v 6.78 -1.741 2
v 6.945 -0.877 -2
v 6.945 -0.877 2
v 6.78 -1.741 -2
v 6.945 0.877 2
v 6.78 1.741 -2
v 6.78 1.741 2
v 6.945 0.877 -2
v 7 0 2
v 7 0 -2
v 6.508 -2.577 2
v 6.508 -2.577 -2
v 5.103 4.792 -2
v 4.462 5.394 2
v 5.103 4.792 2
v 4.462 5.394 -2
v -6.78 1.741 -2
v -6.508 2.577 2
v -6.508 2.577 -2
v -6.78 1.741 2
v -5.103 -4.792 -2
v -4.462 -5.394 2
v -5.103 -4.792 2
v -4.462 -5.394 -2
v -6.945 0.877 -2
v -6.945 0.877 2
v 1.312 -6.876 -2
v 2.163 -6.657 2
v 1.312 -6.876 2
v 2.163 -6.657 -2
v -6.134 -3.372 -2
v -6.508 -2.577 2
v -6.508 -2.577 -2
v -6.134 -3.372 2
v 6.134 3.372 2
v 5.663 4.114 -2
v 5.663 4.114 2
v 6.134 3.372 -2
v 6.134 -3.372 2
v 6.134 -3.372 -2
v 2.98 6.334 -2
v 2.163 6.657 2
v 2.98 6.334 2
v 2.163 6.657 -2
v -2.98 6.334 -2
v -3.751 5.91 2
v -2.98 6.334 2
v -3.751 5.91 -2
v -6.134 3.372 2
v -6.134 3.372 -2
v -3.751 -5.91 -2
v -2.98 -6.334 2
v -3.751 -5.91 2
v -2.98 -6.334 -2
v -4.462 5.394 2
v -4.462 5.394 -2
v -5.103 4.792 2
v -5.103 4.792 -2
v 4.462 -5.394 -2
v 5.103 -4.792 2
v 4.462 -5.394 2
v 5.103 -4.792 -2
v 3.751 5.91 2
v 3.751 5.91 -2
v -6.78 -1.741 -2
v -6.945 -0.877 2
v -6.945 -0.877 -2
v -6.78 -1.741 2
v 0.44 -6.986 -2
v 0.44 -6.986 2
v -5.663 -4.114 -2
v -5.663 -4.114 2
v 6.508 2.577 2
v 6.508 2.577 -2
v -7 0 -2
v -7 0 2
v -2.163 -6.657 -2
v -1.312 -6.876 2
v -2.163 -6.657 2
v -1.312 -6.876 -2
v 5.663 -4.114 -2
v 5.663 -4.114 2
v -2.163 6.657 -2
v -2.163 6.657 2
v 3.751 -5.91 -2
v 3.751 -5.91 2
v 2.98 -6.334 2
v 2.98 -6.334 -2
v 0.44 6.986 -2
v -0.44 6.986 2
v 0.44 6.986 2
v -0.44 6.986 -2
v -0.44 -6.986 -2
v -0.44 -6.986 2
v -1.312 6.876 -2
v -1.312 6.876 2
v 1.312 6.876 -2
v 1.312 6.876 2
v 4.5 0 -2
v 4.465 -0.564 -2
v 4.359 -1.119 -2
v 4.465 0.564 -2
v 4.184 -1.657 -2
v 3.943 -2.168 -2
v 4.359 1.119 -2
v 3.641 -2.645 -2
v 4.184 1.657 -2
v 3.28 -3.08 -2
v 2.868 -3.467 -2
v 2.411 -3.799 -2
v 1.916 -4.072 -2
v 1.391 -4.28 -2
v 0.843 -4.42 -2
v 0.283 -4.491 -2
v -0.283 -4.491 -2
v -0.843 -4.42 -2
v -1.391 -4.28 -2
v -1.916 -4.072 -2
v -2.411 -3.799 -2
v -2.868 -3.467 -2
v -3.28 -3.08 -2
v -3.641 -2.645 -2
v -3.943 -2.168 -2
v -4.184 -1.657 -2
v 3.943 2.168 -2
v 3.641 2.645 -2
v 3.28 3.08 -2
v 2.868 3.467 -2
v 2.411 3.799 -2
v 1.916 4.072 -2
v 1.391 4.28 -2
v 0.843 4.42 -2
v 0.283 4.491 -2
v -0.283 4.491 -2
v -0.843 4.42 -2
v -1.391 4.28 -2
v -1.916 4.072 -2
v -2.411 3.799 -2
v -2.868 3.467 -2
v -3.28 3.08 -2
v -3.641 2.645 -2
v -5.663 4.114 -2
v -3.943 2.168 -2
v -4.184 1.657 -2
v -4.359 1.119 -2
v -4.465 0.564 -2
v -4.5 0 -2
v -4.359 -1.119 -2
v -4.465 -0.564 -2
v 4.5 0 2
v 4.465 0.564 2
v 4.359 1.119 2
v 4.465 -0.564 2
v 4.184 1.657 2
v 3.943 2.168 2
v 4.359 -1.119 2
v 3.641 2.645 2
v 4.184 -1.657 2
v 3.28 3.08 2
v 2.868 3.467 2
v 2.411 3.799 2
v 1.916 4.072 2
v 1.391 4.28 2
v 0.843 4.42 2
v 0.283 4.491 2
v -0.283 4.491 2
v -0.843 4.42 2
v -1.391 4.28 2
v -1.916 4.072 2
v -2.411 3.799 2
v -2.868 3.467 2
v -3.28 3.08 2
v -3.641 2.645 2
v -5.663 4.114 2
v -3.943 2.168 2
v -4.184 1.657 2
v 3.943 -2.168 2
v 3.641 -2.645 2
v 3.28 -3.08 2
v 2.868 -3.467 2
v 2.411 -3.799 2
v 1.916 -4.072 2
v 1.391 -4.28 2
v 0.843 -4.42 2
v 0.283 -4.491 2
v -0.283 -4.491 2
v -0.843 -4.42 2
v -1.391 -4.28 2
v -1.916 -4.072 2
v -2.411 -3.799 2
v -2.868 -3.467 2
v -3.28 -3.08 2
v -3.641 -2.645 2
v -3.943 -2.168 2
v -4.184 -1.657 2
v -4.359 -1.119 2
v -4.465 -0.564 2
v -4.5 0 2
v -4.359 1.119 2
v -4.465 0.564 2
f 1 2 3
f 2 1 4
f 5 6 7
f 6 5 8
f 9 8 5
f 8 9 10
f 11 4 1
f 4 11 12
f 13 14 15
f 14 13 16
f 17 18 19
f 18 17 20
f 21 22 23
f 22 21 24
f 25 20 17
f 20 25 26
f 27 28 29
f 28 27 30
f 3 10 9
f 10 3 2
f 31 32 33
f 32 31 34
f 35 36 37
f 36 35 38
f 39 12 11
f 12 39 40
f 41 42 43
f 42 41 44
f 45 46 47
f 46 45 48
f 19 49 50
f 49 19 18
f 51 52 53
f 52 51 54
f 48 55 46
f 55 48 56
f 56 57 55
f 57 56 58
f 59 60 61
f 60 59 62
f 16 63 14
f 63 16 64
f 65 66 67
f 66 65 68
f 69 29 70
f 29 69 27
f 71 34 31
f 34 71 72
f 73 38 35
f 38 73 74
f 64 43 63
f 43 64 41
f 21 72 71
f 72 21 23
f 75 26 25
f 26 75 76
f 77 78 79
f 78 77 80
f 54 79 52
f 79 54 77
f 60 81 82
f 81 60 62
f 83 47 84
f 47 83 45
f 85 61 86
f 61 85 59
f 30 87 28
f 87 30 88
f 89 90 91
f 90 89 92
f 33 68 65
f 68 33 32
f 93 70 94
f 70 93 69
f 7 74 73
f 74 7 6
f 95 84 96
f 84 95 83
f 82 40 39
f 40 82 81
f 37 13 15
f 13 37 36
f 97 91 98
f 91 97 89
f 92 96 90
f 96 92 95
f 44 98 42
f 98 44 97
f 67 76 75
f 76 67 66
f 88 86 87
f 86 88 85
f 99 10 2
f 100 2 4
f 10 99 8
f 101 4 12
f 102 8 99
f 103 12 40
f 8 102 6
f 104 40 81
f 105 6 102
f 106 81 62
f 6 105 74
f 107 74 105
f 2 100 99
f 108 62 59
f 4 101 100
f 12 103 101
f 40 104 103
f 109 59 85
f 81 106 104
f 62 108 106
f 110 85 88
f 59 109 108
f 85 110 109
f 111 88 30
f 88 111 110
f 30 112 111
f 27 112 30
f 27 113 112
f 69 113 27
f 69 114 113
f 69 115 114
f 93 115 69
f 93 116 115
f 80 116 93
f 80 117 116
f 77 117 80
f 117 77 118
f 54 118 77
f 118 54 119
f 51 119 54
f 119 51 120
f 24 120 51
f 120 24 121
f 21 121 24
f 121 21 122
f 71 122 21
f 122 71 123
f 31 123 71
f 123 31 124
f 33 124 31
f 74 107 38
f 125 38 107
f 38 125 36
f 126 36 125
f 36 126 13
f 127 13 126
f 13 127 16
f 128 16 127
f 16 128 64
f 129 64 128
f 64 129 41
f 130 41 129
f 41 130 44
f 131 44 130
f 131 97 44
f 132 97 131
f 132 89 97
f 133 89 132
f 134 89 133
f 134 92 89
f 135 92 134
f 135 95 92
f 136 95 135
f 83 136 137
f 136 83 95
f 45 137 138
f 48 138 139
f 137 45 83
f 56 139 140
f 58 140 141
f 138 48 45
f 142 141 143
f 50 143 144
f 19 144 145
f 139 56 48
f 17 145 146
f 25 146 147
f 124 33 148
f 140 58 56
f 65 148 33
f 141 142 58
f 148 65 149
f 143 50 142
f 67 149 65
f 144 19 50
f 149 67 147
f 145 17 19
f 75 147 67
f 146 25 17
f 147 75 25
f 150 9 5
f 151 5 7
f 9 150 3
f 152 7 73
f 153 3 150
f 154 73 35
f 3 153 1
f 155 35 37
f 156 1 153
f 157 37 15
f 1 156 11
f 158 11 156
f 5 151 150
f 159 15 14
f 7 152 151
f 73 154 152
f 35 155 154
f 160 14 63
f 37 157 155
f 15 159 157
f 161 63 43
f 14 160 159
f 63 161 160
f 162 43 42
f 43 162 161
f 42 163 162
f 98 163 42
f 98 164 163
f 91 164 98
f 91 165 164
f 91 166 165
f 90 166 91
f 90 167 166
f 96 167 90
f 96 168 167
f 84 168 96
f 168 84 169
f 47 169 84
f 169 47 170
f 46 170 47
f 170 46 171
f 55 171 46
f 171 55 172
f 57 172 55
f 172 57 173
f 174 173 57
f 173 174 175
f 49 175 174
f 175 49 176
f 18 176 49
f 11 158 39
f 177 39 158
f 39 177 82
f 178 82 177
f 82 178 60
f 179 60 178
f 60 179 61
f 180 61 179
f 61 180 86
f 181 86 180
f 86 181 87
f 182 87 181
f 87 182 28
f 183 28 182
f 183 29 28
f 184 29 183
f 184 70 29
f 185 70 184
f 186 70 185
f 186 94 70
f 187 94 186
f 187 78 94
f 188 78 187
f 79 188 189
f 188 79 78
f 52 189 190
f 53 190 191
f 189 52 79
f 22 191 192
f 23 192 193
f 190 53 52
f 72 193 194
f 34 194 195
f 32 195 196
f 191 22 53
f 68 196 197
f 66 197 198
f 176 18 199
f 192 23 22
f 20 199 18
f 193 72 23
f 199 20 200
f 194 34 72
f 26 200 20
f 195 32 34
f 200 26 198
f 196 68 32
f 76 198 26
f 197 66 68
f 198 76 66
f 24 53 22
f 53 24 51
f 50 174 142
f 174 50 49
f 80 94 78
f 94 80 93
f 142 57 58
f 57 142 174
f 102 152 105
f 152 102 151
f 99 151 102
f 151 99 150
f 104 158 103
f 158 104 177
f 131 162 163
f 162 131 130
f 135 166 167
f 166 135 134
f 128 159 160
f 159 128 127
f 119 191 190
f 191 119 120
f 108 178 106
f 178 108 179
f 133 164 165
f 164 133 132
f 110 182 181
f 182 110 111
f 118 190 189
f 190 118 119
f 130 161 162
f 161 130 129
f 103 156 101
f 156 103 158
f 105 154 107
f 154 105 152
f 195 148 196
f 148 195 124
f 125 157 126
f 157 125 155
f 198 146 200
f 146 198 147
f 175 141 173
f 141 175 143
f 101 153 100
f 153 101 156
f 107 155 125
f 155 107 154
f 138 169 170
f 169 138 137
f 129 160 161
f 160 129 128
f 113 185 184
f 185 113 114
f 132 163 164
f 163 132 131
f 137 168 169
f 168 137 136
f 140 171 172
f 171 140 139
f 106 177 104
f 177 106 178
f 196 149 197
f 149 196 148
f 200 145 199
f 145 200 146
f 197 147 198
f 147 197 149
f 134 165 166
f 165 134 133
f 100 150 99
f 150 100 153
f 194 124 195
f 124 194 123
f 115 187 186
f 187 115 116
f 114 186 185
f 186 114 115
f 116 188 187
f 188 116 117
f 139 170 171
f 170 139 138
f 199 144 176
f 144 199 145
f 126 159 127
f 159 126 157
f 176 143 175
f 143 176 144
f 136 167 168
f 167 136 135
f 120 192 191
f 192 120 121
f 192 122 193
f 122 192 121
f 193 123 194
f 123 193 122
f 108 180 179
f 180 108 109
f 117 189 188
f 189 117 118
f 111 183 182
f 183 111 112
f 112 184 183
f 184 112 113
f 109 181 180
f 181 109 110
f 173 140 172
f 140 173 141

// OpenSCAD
$fn = 50;


difference() {
	union() {
		translate(v = [0, 0, -2.0000000000]) {
			cylinder(h = 4, r = 7.0000000000);
		}
	}
	union() {
		translate(v = [0, 0, -100.0000000000]) {
			cylinder(h = 200, r = 4.5000000000);
		}
	}
}
